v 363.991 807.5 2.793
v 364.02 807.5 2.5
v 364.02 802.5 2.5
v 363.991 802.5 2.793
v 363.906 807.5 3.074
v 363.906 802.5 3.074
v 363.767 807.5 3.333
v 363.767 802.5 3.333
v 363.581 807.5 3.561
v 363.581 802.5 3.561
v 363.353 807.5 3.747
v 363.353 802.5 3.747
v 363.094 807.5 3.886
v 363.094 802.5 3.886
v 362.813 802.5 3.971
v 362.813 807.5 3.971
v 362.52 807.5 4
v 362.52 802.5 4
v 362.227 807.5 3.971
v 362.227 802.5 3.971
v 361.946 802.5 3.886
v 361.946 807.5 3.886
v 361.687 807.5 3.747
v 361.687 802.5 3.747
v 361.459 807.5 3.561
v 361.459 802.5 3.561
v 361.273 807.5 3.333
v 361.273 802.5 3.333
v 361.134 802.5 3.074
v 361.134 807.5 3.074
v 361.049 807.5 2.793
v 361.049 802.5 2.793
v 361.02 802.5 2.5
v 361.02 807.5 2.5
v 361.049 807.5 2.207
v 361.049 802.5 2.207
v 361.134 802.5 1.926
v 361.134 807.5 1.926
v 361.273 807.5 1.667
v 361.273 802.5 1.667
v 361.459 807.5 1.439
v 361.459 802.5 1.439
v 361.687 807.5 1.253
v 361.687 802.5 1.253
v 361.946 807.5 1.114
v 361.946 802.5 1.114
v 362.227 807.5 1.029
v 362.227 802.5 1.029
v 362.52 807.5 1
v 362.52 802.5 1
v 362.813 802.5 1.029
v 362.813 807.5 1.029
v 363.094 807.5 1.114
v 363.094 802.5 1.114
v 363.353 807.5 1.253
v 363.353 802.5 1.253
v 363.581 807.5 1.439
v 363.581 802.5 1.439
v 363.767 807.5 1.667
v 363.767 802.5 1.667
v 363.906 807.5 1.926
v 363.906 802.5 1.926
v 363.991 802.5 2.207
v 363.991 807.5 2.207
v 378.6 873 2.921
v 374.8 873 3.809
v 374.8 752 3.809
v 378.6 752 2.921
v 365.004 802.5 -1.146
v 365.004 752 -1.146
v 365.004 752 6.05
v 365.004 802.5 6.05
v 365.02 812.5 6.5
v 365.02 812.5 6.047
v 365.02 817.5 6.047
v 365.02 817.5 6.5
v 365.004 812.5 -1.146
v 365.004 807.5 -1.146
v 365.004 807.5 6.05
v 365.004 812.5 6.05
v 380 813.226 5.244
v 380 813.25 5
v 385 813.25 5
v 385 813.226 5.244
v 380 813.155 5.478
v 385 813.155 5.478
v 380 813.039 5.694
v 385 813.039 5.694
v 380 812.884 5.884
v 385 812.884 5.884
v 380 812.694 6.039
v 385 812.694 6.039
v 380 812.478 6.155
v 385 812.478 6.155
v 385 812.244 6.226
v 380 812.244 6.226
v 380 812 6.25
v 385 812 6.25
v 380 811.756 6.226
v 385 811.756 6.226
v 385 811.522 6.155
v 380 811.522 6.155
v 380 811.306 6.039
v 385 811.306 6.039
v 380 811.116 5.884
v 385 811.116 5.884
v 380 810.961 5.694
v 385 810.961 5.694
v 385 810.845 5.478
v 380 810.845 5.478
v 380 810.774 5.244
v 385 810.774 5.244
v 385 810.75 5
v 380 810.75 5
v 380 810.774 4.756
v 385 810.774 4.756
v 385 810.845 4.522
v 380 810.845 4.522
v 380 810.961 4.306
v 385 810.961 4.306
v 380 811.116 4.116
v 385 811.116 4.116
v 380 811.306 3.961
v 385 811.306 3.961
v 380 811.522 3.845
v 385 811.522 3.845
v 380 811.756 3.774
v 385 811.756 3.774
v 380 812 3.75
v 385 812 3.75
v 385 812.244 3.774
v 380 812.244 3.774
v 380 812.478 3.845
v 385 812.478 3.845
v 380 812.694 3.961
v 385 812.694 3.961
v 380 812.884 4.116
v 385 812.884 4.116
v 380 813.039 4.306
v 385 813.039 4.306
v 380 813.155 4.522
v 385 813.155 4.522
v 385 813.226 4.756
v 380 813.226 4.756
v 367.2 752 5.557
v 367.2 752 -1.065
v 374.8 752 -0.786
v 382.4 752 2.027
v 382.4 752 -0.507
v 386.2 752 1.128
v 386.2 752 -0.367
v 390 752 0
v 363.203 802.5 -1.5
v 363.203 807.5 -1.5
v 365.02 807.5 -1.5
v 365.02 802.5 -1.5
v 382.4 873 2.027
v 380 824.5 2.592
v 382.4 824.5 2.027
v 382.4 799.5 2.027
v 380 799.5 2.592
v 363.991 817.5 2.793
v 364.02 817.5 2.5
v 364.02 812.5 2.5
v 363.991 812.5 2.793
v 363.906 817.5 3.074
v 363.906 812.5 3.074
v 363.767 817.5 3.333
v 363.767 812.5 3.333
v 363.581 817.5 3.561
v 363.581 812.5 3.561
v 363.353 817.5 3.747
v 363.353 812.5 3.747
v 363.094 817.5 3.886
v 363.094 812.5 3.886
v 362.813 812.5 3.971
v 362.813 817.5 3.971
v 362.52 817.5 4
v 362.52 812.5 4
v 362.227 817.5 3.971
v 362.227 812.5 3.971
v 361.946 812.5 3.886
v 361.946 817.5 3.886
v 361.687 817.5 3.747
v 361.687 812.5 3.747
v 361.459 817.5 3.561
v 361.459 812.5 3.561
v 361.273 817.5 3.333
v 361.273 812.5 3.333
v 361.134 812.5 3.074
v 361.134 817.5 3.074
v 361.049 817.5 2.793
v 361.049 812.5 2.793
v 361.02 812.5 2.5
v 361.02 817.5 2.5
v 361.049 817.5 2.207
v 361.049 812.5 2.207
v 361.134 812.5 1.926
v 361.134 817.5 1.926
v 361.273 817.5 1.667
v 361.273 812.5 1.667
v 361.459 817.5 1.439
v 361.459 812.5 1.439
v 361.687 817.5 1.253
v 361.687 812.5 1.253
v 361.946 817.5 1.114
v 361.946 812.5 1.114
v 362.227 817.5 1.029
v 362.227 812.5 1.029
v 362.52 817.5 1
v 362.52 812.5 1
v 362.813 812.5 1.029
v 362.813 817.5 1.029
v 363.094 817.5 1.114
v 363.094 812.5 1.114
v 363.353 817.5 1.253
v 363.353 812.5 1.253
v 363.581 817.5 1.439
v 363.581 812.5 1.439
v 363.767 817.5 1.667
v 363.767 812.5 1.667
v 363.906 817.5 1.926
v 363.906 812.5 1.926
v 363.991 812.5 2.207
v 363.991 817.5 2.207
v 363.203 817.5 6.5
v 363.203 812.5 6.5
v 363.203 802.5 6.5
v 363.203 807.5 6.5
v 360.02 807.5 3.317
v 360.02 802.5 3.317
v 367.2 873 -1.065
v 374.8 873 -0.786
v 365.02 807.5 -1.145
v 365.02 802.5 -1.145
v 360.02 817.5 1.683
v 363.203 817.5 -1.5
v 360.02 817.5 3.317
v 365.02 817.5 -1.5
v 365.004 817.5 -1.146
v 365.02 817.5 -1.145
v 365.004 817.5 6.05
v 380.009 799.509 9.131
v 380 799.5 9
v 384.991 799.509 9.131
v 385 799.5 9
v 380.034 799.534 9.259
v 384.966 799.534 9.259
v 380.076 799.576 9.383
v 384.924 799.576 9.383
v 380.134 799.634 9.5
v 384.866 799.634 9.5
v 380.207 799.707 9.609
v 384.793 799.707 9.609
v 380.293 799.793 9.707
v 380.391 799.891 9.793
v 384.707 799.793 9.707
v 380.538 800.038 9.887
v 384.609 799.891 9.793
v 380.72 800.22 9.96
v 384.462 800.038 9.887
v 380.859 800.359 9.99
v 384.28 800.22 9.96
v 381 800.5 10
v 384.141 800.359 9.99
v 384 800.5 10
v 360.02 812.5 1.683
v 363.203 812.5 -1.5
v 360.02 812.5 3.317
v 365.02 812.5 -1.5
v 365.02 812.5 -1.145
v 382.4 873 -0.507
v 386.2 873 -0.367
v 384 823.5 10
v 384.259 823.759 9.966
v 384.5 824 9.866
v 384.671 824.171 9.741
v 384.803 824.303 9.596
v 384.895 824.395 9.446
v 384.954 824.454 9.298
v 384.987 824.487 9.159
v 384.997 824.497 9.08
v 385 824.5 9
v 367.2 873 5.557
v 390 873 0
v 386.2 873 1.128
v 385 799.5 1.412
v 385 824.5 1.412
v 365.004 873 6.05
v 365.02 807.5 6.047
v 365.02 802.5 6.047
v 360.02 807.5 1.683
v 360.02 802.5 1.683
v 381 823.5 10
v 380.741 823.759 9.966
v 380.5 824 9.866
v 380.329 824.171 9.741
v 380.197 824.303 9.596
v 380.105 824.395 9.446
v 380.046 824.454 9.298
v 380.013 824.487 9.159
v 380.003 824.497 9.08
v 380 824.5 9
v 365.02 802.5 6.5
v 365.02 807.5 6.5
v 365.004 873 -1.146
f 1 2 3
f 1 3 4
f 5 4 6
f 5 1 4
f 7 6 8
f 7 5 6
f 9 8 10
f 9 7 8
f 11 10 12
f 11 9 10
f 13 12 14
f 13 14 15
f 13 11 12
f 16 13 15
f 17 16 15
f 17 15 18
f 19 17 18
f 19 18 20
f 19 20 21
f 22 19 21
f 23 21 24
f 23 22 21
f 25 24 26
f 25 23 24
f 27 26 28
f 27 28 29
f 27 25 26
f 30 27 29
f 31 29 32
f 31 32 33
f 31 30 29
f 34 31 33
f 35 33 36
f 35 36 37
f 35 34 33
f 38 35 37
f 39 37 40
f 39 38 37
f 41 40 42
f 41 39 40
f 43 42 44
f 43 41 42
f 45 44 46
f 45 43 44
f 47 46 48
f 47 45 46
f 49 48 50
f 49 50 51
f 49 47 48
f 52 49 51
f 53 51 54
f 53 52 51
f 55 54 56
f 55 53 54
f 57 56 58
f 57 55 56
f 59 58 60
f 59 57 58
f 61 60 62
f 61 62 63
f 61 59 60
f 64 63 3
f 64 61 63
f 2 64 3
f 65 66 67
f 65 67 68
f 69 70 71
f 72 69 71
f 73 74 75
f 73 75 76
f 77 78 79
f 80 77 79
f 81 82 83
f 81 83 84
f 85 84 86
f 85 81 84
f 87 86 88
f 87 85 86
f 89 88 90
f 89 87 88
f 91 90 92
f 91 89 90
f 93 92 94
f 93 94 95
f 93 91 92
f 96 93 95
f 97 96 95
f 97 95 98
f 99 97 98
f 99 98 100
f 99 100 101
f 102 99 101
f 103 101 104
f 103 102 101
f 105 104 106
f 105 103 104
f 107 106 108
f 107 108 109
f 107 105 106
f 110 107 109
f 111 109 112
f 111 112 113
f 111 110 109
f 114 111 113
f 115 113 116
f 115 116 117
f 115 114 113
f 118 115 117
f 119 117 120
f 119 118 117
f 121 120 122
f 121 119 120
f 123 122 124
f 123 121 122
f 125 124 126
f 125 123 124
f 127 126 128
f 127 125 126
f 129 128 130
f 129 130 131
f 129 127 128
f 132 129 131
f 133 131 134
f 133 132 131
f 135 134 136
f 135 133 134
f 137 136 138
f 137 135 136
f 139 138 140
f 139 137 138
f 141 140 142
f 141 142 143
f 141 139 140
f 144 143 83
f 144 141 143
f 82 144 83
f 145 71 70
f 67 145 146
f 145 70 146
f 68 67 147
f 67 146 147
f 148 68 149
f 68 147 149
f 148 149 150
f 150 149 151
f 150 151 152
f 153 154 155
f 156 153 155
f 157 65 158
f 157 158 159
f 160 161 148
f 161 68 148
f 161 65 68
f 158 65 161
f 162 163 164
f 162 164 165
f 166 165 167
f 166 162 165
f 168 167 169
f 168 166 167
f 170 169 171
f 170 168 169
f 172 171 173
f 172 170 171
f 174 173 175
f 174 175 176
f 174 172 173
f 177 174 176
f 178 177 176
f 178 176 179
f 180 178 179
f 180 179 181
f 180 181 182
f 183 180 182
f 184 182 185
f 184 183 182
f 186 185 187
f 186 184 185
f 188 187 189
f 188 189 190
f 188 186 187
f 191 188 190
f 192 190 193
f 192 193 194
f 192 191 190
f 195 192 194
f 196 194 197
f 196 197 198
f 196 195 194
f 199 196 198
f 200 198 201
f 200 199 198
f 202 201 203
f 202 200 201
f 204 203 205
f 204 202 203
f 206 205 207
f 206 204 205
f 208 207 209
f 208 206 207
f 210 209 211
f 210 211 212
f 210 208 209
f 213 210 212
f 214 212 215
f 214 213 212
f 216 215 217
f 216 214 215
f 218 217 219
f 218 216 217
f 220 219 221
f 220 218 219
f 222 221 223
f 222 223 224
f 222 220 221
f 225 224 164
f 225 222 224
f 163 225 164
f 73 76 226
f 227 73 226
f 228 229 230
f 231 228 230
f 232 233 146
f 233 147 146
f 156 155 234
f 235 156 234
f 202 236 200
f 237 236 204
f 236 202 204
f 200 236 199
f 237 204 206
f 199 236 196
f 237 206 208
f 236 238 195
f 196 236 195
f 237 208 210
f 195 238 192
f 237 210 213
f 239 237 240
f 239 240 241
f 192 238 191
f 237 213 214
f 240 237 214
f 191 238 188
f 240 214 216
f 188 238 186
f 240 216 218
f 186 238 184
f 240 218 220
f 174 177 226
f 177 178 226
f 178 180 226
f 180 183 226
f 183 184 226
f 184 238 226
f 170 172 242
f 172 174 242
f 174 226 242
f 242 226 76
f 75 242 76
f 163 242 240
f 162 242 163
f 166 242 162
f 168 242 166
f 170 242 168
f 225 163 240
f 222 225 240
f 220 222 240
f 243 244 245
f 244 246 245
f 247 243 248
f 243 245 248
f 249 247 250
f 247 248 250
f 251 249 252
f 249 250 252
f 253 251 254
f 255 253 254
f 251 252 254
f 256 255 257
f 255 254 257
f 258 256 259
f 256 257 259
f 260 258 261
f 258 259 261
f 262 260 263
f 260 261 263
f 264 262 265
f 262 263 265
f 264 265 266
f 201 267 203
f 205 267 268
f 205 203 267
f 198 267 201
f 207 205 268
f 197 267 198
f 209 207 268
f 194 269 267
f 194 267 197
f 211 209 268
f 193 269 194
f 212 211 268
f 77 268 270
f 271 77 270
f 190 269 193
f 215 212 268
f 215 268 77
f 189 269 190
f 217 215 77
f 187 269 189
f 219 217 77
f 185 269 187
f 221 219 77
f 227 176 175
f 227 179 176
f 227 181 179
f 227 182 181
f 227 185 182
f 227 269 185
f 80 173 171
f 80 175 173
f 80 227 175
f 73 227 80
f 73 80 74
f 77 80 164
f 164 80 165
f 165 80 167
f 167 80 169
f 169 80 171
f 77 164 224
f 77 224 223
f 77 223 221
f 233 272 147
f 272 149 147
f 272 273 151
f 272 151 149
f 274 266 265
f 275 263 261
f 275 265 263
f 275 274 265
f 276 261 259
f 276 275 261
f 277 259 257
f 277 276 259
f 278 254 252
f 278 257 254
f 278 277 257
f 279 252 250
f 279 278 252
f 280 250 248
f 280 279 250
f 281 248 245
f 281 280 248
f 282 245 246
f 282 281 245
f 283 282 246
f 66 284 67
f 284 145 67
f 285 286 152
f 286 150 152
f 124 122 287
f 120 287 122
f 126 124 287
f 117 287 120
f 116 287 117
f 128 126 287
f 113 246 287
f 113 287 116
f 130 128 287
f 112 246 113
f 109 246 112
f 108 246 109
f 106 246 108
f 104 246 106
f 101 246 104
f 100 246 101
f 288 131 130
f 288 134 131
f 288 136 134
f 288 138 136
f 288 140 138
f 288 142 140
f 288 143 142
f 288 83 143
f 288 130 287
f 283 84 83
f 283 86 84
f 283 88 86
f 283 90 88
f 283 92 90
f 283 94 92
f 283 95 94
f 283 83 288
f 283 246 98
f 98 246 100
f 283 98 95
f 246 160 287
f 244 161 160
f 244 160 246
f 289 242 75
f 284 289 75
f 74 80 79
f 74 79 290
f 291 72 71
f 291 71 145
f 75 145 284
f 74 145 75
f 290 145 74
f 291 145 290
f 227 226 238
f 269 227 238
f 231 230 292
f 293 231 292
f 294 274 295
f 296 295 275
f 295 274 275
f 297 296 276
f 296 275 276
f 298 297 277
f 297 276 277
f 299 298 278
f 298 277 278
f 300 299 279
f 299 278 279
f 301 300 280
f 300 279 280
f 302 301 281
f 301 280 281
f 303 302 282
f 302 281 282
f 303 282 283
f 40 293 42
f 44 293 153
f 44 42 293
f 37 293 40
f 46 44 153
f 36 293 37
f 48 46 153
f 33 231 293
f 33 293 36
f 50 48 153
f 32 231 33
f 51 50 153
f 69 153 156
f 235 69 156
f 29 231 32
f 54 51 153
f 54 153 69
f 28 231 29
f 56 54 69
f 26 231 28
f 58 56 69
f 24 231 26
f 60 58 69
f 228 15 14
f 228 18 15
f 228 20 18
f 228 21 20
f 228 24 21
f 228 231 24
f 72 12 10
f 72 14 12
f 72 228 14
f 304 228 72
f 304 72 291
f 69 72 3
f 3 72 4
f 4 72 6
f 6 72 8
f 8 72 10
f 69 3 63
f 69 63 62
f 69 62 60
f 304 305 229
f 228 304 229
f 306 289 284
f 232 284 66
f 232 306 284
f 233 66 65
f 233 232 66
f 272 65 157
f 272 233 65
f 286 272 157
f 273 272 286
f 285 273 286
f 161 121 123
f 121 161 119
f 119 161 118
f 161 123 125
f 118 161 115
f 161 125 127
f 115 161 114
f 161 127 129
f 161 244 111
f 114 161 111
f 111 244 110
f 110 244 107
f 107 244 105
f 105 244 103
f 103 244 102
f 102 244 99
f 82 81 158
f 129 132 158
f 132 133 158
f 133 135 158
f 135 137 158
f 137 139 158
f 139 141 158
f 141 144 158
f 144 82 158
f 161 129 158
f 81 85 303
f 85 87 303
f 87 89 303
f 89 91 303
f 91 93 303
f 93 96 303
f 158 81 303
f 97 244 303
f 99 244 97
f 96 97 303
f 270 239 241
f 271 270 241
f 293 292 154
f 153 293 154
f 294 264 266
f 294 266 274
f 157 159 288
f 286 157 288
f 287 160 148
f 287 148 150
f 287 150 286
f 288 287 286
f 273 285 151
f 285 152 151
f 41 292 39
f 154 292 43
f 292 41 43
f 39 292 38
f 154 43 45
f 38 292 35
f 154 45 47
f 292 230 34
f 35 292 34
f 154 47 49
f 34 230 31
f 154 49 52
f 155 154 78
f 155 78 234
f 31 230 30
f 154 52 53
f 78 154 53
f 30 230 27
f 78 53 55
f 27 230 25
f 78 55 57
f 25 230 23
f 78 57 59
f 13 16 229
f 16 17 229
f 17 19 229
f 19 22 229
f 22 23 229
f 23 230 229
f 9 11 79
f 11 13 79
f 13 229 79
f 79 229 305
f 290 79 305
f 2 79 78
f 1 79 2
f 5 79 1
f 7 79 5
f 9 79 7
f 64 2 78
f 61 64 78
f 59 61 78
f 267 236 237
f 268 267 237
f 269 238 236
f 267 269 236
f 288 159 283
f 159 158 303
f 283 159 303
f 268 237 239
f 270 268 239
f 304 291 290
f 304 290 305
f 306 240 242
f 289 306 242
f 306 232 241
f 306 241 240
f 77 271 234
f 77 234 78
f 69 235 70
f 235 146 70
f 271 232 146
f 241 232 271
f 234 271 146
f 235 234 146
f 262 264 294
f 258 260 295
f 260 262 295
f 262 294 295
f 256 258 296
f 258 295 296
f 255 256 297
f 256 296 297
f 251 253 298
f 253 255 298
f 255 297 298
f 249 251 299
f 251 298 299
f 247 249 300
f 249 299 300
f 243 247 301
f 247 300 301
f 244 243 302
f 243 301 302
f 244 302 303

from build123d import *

# Parameters (mm, degrees)
SKETCH023_R  = 1.5
PAD009_DEPTH = 5
SKETCH022_R  = 1.5
PAD012_DEPTH = 5
SKETCH026_W  = 25
SKETCH026_H  = 10
SKETCH026_R  = 1.25
PAD015_DEPTH = 5
FILLET001_R  = 1


with BuildPart() as body015:
    # Sketch023 → Pad009 (new body)
    with BuildSketch(Plane(origin=(0.02, 0, 0), x_dir=(1, 0, 0), z_dir=(0, -1, 0))):
        Polygon((0.683099, -4), (2.5, -4), (2.5, 4), (0.683099, 4), (-2.5, 0.816901), (-2.5, -0.816901), align=None)
        Circle(SKETCH023_R, mode=Mode.SUBTRACT)
    extrude(amount=PAD009_DEPTH)


with BuildPart() as body015_1:
    # Body015 placement: moved
    add(body015.part.moved(Location((362.5, 807.5, 2.5))))


with BuildPart() as body014:
    # Sketch022 → Pad012 (new body)
    with BuildSketch(Plane(origin=(0.02, 0, 0), x_dir=(1, 0, 0), z_dir=(0, -1, 0))):
        Polygon((0.683099, -4), (2.5, -4), (2.5, 4), (0.683099, 4), (-2.5, 0.816901), (-2.5, -0.816901), align=None)
        Circle(SKETCH022_R, mode=Mode.SUBTRACT)
    extrude(amount=PAD012_DEPTH)


with BuildPart() as body014_1:
    # Body014 placement: moved
    add(body014.part.moved(Location((362.5, 817.5, 2.5))))


with BuildPart() as hinge_flap:
    # Sketch026 → Pad015 (new body)
    with BuildSketch(Plane.YZ):
        Rectangle(SKETCH026_W, SKETCH026_H)
        Circle(SKETCH026_R, mode=Mode.SUBTRACT)
    extrude(amount=PAD015_DEPTH)

    # Fillet001
    fillet001_edges = [hinge_flap.edges().sort_by_distance(p)[0] for p in [
        (2.5, 12.5, 5),
        (2.5, -12.5, 5),
        (0, 0, 5),
        (5, 0, 5),
    ]]
    fillet(fillet001_edges, radius=FILLET001_R)


with BuildPart() as hinge_flap_1:
    # Body018 placement: moved
    add(hinge_flap.part.moved(Location((380, 812, 5))))


with BuildPart() as flap:
    # Sketch013 → AdditiveLoft002 section 0
    with BuildSketch(Plane(origin=(10, 873, 0), x_dir=(1, 0, 0), z_dir=(0, -1, 0))):
        Polygon((357.2, 5.557082), (364.8, 3.808816), (368.6, 2.920984), (372.4, 2.02673), (376.2, 1.12822), (380, 0), (376.2, -0.367308), (372.4, -0.506882), (368.6, -0.646418), (364.8, -0.785954), (357.2, -1.065064), (355.003606, -1.145727), (355.003606, 6.050359), align=None)
    # Sketch015 → AdditiveLoft002 section 1
    with BuildSketch(Plane(origin=(10, 752, 0), x_dir=(1, 0, 0), z_dir=(0, -1, 0))):
        Polygon((357.2, 5.557082), (364.8, 3.808816), (368.6, 2.920984), (372.4, 2.02673), (376.2, 1.12822), (380, 0), (376.2, -0.367308), (372.4, -0.506882), (368.6, -0.646418), (364.8, -0.785954), (357.2, -1.065064), (355.003606, -1.145727), (355.003606, 6.050359), align=None)
    loft()

    # Boolean003: union Body015, Body014
    add(body015_1.part)
    add(body014_1.part)

    # Boolean005: union hinge_flap
    add(hinge_flap_1.part)


solid = flap.part
